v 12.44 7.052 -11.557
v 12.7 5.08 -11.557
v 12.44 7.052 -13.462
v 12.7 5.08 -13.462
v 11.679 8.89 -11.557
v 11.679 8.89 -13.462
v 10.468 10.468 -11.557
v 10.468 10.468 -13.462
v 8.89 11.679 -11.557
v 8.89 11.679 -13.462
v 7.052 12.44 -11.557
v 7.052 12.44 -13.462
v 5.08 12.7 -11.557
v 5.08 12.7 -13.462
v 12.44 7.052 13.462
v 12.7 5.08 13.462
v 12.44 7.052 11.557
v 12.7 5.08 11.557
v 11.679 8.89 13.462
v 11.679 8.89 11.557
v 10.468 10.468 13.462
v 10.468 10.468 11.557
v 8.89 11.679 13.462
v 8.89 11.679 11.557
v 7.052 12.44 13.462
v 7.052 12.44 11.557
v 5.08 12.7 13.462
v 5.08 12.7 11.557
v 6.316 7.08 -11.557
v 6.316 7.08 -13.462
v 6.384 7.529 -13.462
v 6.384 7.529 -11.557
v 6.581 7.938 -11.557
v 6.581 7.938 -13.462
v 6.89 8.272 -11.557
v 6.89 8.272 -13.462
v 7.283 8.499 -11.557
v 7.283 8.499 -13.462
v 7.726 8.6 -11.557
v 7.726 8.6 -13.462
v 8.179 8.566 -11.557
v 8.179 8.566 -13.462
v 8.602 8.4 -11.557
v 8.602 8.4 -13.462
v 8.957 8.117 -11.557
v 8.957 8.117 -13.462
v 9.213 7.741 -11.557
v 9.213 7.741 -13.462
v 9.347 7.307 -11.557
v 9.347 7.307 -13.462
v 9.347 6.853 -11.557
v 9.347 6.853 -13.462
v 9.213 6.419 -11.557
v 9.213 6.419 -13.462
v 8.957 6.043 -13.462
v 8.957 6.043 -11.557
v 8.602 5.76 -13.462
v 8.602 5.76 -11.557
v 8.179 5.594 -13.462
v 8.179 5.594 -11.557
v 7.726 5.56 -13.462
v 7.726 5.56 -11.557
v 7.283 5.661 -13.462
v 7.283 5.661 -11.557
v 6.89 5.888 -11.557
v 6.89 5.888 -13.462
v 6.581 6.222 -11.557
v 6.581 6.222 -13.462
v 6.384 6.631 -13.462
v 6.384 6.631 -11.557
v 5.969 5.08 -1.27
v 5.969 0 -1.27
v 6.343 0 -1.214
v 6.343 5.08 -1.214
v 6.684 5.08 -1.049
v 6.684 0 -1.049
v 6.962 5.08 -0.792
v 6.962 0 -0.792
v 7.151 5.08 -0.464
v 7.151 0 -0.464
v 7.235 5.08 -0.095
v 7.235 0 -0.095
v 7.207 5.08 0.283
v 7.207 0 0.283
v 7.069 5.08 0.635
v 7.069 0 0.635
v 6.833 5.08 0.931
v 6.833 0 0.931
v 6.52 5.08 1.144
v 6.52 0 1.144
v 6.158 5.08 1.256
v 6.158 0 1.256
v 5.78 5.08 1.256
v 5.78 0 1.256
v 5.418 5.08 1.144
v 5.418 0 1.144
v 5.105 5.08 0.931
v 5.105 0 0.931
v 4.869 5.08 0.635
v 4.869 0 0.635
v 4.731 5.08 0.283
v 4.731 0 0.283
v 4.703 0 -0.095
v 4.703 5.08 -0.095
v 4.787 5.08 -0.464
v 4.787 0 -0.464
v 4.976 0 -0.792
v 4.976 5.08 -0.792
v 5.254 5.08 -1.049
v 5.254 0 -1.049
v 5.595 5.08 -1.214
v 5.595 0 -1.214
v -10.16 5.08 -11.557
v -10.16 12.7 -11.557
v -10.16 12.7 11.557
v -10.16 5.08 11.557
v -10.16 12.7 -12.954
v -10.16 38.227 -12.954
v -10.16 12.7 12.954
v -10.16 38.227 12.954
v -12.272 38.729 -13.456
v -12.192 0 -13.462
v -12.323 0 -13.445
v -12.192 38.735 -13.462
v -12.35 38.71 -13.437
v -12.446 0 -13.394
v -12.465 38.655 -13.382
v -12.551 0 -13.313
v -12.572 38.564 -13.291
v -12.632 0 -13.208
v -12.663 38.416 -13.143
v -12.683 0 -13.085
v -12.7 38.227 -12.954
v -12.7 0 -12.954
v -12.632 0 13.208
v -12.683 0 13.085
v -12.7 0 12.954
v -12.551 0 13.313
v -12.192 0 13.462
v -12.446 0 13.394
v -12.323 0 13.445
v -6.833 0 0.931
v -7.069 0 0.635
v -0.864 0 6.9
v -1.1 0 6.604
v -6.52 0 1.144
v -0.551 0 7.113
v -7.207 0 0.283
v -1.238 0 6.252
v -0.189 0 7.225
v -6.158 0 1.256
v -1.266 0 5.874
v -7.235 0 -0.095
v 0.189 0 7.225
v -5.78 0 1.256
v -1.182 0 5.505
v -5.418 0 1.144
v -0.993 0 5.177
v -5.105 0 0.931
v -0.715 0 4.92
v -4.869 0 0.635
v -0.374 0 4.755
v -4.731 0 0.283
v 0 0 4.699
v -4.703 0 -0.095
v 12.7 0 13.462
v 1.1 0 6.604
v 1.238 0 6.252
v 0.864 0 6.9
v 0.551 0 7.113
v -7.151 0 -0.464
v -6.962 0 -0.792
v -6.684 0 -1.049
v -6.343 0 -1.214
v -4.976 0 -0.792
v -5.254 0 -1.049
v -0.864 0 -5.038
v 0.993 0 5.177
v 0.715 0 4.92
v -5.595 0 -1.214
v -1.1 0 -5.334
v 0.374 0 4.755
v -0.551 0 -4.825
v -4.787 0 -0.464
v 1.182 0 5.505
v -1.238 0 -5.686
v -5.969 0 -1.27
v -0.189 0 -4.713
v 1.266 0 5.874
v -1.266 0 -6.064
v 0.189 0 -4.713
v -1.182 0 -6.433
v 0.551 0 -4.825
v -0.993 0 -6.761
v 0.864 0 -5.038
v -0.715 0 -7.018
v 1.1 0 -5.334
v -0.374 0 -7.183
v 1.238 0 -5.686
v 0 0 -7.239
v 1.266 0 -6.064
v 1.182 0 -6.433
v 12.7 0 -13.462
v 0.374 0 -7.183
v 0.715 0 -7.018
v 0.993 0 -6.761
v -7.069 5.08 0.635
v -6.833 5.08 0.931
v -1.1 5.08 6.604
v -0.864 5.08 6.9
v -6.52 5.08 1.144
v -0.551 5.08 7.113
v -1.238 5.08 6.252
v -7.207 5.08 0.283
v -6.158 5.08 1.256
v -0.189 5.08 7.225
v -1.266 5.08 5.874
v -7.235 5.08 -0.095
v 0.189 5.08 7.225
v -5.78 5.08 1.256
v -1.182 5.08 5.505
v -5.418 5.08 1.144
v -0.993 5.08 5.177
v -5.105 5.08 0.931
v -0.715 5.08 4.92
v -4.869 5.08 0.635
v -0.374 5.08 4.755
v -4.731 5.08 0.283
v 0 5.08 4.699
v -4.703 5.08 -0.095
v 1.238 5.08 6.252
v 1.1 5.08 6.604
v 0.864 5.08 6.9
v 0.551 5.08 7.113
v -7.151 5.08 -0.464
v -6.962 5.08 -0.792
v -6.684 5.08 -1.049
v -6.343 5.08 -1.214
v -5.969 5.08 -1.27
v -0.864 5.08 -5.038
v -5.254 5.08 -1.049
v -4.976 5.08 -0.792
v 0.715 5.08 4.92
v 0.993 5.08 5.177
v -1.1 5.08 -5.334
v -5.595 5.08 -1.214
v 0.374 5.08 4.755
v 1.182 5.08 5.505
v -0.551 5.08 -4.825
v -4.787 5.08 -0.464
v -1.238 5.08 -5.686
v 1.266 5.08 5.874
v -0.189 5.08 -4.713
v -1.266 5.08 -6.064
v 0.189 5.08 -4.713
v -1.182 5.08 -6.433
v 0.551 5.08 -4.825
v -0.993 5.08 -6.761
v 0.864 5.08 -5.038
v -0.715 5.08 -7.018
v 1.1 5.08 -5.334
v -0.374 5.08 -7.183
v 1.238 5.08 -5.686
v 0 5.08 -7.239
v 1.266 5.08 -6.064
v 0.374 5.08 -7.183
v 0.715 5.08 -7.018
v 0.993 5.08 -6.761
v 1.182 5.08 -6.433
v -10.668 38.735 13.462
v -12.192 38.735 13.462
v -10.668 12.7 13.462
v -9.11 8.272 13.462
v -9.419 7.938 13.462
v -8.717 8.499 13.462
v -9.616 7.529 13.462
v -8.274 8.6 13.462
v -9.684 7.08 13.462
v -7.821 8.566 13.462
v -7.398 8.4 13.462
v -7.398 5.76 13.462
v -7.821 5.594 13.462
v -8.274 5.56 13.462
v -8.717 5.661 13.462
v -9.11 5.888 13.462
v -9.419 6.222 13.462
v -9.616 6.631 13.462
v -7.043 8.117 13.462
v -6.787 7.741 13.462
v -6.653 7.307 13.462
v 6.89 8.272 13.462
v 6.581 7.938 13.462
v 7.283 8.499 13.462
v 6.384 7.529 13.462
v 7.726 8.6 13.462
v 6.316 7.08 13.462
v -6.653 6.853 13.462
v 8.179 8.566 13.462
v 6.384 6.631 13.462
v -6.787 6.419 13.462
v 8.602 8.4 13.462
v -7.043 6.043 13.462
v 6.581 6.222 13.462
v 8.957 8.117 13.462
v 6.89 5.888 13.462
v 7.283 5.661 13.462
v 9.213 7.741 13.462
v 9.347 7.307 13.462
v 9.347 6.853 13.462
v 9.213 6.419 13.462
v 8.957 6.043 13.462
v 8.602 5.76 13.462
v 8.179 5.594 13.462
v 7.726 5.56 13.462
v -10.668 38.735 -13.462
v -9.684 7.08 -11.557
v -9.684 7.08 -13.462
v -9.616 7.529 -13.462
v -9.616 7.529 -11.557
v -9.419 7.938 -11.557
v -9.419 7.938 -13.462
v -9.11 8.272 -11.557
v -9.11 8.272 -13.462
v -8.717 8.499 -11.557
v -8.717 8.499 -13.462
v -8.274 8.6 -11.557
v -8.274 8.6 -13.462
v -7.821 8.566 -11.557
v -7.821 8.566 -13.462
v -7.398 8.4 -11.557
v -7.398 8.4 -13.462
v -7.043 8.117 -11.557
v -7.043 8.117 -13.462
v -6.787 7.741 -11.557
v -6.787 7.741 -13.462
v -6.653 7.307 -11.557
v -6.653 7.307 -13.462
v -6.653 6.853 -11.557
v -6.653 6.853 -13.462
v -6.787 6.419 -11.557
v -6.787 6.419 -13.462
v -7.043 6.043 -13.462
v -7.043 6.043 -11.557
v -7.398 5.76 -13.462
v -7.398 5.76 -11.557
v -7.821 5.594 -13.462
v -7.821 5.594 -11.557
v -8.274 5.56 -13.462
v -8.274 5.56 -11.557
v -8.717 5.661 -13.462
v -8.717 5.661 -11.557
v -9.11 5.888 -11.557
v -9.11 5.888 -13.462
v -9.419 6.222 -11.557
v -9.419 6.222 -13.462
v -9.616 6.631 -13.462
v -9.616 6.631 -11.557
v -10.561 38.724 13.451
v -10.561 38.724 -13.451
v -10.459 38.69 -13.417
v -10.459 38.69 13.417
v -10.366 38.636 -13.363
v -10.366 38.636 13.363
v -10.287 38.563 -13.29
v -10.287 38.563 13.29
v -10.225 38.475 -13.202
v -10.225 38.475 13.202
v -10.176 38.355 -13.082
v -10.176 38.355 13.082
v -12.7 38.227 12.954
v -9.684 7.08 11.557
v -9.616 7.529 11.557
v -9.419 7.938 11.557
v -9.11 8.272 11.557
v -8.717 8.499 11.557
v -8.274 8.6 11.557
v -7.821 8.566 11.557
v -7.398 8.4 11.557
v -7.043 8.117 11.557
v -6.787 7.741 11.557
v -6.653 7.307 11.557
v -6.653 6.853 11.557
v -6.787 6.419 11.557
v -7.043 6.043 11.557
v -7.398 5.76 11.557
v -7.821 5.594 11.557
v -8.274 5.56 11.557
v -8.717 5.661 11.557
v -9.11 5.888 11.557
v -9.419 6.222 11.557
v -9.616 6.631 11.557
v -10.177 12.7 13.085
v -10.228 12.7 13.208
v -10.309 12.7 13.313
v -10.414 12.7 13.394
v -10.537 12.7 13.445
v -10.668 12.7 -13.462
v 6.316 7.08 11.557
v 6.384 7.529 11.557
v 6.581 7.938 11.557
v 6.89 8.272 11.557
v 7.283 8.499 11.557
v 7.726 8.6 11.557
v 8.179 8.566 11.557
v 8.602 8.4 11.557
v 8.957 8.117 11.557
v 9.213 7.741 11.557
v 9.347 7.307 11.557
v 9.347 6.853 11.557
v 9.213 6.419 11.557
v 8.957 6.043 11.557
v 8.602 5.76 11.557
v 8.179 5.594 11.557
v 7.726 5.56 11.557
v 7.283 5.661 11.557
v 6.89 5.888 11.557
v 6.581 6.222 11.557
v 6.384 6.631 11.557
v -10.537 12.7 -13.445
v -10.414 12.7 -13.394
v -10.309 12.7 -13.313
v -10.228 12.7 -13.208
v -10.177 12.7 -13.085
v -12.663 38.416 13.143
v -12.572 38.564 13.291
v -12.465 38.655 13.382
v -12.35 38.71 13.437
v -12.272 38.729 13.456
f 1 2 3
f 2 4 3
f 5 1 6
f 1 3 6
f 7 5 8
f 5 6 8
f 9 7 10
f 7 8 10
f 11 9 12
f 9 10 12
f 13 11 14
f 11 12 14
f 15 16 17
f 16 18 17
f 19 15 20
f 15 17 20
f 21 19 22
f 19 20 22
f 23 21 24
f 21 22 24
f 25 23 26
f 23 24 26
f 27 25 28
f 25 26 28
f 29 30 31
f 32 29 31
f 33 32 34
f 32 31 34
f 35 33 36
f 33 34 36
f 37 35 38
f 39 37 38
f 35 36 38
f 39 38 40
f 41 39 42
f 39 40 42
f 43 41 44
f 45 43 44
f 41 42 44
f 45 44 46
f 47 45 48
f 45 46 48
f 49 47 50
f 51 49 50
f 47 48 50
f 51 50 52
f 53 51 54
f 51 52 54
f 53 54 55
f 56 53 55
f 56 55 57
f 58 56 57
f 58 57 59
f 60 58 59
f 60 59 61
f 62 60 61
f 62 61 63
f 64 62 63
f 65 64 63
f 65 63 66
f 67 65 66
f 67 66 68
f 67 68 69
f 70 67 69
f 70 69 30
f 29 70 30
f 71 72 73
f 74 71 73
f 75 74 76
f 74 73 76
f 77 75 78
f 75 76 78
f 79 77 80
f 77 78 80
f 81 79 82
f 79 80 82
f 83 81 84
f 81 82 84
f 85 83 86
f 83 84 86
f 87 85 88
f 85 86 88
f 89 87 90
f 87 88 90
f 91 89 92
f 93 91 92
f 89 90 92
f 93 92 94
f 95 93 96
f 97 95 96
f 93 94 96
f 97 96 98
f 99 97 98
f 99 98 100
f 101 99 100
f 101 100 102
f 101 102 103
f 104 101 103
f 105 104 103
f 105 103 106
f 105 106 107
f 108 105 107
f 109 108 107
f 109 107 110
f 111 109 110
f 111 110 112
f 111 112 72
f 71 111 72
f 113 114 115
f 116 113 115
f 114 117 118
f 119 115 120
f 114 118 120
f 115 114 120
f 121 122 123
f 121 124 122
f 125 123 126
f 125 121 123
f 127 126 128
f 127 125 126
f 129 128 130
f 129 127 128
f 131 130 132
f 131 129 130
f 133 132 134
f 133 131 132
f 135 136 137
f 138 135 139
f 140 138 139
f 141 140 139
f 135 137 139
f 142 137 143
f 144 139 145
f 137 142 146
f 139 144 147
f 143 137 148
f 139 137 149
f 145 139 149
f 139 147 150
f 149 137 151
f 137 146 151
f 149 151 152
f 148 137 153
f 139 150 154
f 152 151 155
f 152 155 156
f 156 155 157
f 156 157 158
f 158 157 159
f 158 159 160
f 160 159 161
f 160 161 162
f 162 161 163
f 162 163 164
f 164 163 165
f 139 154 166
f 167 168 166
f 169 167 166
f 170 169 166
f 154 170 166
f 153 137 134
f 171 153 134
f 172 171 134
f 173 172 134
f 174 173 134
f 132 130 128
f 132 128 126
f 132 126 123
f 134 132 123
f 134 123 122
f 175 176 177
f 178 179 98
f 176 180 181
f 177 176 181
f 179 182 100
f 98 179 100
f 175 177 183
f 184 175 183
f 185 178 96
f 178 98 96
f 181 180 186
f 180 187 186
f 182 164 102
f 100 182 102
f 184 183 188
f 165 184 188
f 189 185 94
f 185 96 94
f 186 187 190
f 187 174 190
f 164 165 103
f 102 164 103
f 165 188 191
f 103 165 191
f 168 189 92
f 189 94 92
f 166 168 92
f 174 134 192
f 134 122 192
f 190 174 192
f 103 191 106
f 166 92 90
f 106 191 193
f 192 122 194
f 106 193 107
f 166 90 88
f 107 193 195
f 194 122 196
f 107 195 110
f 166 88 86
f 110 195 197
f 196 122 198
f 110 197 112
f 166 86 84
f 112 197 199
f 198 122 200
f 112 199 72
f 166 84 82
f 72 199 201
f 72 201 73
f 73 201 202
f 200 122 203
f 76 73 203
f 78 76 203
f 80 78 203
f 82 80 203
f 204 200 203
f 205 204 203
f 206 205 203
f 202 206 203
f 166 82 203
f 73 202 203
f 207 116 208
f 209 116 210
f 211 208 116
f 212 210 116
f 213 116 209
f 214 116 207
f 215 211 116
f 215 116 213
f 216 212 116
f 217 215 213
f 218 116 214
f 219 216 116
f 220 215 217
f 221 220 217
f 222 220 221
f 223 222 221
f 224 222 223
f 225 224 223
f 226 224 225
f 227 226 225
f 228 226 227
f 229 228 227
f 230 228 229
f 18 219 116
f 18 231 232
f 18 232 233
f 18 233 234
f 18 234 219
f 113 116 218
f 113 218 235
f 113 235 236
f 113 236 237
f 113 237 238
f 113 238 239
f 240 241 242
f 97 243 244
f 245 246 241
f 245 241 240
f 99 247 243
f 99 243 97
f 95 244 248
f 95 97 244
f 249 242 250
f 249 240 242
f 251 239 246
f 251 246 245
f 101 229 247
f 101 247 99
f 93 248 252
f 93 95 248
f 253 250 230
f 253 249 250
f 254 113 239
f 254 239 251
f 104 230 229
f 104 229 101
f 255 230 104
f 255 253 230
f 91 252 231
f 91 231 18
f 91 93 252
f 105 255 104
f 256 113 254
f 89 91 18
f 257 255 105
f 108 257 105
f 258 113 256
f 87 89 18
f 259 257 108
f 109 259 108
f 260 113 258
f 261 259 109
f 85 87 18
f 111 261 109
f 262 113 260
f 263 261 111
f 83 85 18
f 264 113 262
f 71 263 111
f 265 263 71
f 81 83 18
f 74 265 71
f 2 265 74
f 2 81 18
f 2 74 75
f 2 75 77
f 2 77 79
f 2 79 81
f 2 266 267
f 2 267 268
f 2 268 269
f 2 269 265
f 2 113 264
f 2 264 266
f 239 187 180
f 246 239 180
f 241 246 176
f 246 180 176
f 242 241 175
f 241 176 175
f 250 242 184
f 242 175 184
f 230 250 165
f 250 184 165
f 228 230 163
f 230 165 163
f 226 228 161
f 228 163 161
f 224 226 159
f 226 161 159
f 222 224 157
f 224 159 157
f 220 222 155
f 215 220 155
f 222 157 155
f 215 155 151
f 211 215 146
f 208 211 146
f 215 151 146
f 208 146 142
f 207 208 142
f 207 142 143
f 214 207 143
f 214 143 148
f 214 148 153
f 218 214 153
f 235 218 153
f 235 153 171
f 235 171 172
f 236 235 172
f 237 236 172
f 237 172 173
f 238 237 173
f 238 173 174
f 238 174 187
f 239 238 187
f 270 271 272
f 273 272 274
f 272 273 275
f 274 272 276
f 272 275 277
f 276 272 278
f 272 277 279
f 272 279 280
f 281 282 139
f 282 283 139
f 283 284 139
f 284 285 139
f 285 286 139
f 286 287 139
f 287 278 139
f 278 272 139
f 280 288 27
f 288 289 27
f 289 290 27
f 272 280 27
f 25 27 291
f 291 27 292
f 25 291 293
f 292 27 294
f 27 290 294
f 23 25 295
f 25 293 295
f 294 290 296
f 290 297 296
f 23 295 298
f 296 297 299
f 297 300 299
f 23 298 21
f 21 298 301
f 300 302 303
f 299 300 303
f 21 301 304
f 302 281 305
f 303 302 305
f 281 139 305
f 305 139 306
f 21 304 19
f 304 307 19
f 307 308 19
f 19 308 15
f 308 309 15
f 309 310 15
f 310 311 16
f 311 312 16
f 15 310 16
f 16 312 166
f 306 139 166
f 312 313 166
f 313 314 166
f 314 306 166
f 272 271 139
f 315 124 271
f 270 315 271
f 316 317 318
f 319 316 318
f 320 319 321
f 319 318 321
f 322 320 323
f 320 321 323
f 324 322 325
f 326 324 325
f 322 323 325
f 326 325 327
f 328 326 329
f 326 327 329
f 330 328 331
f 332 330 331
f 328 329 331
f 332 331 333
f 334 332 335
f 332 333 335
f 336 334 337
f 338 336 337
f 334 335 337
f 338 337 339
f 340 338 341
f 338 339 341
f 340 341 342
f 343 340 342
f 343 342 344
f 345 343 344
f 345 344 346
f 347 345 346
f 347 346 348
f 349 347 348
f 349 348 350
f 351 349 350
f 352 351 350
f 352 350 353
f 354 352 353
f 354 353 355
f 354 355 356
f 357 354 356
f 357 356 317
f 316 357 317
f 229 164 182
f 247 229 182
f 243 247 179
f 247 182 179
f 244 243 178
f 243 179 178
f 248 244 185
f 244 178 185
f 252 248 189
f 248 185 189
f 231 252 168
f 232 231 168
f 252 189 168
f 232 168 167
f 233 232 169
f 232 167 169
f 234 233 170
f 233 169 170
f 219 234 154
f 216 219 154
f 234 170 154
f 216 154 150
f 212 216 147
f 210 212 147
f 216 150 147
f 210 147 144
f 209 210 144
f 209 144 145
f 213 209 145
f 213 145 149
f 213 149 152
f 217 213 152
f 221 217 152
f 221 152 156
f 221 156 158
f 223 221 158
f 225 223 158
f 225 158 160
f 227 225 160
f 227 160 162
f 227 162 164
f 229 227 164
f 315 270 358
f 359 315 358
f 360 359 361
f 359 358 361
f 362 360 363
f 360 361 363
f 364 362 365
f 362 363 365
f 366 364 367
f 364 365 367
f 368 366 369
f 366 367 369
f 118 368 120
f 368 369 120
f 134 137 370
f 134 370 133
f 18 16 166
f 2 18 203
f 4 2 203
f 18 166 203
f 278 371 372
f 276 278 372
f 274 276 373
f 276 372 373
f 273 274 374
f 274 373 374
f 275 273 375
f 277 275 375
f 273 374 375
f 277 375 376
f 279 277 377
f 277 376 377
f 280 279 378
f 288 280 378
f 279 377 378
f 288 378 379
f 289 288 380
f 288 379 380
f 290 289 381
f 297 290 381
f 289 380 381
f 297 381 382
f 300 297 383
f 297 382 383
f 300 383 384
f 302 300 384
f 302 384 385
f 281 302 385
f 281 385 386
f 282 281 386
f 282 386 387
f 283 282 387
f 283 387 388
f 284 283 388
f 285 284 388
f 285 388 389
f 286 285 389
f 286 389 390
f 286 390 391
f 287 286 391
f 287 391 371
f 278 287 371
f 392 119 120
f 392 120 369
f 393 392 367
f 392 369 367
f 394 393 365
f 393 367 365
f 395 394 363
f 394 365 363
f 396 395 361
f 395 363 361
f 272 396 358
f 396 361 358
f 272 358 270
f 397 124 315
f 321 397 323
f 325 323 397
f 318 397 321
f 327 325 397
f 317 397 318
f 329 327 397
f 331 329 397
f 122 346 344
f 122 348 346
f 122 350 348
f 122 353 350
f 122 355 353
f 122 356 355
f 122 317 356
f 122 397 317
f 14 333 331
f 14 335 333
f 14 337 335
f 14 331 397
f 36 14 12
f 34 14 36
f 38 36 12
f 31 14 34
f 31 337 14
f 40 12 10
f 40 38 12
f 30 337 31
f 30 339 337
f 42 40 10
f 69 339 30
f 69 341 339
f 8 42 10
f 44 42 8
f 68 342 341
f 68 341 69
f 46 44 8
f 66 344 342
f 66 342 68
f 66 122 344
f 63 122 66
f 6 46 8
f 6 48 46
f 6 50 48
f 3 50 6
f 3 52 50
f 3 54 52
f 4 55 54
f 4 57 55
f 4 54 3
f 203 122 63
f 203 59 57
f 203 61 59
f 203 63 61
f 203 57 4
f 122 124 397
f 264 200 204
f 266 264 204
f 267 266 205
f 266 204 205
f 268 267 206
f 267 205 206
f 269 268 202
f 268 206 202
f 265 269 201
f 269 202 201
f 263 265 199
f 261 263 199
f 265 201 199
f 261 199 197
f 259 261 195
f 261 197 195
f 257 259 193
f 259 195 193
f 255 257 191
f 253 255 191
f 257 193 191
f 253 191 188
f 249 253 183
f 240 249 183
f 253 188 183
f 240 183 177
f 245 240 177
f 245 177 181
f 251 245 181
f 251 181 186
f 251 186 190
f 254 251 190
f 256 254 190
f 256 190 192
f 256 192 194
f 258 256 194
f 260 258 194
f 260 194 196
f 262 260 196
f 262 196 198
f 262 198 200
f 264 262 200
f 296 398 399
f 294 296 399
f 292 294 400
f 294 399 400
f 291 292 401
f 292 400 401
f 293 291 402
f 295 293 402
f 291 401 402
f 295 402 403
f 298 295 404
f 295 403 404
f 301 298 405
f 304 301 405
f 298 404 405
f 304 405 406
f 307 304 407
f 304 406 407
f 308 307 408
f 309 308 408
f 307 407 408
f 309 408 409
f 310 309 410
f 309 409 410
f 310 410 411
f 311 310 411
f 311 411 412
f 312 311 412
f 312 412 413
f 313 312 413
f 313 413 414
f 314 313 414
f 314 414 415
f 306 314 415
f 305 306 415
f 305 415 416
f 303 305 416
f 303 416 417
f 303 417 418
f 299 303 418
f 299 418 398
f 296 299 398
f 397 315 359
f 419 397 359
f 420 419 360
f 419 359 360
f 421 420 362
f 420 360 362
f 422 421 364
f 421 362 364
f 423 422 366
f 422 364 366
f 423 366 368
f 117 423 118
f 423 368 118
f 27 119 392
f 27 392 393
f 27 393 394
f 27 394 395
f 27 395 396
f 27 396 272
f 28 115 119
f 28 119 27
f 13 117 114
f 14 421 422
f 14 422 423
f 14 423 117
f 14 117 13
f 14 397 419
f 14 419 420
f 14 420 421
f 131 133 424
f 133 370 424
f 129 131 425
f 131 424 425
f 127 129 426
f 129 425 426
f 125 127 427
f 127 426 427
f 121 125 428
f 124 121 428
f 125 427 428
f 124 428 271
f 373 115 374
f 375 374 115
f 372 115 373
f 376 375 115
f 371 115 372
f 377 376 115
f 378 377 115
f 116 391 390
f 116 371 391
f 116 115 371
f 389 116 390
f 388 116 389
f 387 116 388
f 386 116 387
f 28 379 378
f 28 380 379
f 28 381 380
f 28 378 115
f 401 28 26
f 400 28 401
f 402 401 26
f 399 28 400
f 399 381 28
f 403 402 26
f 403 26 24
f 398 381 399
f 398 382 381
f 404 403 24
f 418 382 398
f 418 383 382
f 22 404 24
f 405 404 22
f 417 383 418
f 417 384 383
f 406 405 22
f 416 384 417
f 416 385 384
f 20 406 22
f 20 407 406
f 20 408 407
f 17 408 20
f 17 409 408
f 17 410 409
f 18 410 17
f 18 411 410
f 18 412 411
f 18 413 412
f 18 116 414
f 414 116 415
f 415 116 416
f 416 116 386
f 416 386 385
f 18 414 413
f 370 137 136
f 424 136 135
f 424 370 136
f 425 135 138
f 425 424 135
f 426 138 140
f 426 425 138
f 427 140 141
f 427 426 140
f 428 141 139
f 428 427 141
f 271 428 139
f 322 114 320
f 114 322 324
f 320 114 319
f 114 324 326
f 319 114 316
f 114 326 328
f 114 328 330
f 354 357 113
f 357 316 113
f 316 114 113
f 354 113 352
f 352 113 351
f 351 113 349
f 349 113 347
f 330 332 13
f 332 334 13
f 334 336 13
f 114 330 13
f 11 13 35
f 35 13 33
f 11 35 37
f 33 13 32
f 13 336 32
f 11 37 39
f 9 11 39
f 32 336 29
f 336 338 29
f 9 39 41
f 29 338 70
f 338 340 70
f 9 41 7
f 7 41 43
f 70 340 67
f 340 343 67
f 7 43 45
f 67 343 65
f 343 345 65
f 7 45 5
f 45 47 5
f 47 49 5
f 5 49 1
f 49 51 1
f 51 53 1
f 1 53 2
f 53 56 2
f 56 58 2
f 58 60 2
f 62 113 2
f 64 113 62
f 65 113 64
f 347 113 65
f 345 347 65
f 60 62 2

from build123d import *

# Parameters (mm, degrees)
SKETCH1_W           = 25.4
SKETCH1_H           = 26.924
BOSS_EXTRUDE1_DEPTH = 5.08
SKETCH2_W           = 25.4
SKETCH2_H           = 1.905
BOSS_EXTRUDE2_DEPTH = 7.62
FILLET1_R           = 7.62
SKETCH4_W           = 26.924
SKETCH4_H           = 38.735
BOSS_EXTRUDE3_DEPTH = 2.54
SKETCH6_R           = 1.27
CUT_EXTRUDE2_DEPTH  = 43.929193668
FILLET2_R           = 0.508
SKETCH8_R           = 1.524
CUT_EXTRUDE4_DEPTH  = 49.852758377


with BuildPart() as part:
    # Sketch1 → Boss-Extrude1 (new body)
    with BuildSketch(Plane(origin=(0, 0, 0), x_dir=(1, 0, 0), z_dir=(0, 1, 0))):
        Rectangle(SKETCH1_W, SKETCH1_H)
    extrude(amount=BOSS_EXTRUDE1_DEPTH)

    # Sketch2 → Boss-Extrude2 (add)
    with BuildSketch(Plane(origin=(0, 5.08, 0), x_dir=(1, 0, 0), z_dir=(0, 1, 0))):
        with Locations((0, 12.5095)):
            Rectangle(SKETCH2_W, SKETCH2_H)
        with Locations((0, -12.5095)):
            Rectangle(SKETCH2_W, SKETCH2_H)
    extrude(amount=BOSS_EXTRUDE2_DEPTH)

    # Fillet1
    fillet1_edges = [part.edges().sort_by_distance(p)[0] for p in [
        (12.7, 12.7, -12.5095),
        (12.7, 12.7, 12.5095),
    ]]
    fillet(fillet1_edges, radius=FILLET1_R)

    # Sketch4 → Boss-Extrude3 (add)
    with BuildSketch(Plane.ZY.offset(12.7)):
        with Locations((0, 19.3675)):
            Rectangle(SKETCH4_W, SKETCH4_H)
    extrude(amount=-BOSS_EXTRUDE3_DEPTH)

    # Sketch6 → Cut-Extrude2 (cut, through all)
    with BuildSketch(Plane.XZ):
        with Locations((0, 5.969)):
            Circle(SKETCH6_R)
        with Locations((5.969, 0)):
            Circle(SKETCH6_R)
        with Locations((0, -5.969)):
            Circle(SKETCH6_R)
        with Locations((-5.969, 0)):
            Circle(SKETCH6_R)
    extrude(amount=-CUT_EXTRUDE2_DEPTH, mode=Mode.SUBTRACT)

    # Fillet2
    fillet2_edges = [part.edges().sort_by_distance(p)[0] for p in [
        (-10.16, 38.735, 0),
        (-12.7, 38.735, 0),
        (-10.16, 25.7175, 13.462),
        (-12.7, 19.3675, 13.462),
        (-12.7, 19.3675, -13.462),
        (-10.16, 25.7175, -13.462),
    ]]
    fillet(fillet2_edges, radius=FILLET2_R)

    # Sketch8 → Cut-Extrude4 (cut, through all)
    with BuildSketch(Plane(origin=(0, 0, -13.462), x_dir=(-1, 0, 0), z_dir=(0, 0, -1))):
        with Locations((-7.84, 7.08)):
            Circle(SKETCH8_R)
        with Locations((8.16, 7.08)):
            Circle(SKETCH8_R)
    extrude(amount=-CUT_EXTRUDE4_DEPTH, mode=Mode.SUBTRACT)


solid = part.part
